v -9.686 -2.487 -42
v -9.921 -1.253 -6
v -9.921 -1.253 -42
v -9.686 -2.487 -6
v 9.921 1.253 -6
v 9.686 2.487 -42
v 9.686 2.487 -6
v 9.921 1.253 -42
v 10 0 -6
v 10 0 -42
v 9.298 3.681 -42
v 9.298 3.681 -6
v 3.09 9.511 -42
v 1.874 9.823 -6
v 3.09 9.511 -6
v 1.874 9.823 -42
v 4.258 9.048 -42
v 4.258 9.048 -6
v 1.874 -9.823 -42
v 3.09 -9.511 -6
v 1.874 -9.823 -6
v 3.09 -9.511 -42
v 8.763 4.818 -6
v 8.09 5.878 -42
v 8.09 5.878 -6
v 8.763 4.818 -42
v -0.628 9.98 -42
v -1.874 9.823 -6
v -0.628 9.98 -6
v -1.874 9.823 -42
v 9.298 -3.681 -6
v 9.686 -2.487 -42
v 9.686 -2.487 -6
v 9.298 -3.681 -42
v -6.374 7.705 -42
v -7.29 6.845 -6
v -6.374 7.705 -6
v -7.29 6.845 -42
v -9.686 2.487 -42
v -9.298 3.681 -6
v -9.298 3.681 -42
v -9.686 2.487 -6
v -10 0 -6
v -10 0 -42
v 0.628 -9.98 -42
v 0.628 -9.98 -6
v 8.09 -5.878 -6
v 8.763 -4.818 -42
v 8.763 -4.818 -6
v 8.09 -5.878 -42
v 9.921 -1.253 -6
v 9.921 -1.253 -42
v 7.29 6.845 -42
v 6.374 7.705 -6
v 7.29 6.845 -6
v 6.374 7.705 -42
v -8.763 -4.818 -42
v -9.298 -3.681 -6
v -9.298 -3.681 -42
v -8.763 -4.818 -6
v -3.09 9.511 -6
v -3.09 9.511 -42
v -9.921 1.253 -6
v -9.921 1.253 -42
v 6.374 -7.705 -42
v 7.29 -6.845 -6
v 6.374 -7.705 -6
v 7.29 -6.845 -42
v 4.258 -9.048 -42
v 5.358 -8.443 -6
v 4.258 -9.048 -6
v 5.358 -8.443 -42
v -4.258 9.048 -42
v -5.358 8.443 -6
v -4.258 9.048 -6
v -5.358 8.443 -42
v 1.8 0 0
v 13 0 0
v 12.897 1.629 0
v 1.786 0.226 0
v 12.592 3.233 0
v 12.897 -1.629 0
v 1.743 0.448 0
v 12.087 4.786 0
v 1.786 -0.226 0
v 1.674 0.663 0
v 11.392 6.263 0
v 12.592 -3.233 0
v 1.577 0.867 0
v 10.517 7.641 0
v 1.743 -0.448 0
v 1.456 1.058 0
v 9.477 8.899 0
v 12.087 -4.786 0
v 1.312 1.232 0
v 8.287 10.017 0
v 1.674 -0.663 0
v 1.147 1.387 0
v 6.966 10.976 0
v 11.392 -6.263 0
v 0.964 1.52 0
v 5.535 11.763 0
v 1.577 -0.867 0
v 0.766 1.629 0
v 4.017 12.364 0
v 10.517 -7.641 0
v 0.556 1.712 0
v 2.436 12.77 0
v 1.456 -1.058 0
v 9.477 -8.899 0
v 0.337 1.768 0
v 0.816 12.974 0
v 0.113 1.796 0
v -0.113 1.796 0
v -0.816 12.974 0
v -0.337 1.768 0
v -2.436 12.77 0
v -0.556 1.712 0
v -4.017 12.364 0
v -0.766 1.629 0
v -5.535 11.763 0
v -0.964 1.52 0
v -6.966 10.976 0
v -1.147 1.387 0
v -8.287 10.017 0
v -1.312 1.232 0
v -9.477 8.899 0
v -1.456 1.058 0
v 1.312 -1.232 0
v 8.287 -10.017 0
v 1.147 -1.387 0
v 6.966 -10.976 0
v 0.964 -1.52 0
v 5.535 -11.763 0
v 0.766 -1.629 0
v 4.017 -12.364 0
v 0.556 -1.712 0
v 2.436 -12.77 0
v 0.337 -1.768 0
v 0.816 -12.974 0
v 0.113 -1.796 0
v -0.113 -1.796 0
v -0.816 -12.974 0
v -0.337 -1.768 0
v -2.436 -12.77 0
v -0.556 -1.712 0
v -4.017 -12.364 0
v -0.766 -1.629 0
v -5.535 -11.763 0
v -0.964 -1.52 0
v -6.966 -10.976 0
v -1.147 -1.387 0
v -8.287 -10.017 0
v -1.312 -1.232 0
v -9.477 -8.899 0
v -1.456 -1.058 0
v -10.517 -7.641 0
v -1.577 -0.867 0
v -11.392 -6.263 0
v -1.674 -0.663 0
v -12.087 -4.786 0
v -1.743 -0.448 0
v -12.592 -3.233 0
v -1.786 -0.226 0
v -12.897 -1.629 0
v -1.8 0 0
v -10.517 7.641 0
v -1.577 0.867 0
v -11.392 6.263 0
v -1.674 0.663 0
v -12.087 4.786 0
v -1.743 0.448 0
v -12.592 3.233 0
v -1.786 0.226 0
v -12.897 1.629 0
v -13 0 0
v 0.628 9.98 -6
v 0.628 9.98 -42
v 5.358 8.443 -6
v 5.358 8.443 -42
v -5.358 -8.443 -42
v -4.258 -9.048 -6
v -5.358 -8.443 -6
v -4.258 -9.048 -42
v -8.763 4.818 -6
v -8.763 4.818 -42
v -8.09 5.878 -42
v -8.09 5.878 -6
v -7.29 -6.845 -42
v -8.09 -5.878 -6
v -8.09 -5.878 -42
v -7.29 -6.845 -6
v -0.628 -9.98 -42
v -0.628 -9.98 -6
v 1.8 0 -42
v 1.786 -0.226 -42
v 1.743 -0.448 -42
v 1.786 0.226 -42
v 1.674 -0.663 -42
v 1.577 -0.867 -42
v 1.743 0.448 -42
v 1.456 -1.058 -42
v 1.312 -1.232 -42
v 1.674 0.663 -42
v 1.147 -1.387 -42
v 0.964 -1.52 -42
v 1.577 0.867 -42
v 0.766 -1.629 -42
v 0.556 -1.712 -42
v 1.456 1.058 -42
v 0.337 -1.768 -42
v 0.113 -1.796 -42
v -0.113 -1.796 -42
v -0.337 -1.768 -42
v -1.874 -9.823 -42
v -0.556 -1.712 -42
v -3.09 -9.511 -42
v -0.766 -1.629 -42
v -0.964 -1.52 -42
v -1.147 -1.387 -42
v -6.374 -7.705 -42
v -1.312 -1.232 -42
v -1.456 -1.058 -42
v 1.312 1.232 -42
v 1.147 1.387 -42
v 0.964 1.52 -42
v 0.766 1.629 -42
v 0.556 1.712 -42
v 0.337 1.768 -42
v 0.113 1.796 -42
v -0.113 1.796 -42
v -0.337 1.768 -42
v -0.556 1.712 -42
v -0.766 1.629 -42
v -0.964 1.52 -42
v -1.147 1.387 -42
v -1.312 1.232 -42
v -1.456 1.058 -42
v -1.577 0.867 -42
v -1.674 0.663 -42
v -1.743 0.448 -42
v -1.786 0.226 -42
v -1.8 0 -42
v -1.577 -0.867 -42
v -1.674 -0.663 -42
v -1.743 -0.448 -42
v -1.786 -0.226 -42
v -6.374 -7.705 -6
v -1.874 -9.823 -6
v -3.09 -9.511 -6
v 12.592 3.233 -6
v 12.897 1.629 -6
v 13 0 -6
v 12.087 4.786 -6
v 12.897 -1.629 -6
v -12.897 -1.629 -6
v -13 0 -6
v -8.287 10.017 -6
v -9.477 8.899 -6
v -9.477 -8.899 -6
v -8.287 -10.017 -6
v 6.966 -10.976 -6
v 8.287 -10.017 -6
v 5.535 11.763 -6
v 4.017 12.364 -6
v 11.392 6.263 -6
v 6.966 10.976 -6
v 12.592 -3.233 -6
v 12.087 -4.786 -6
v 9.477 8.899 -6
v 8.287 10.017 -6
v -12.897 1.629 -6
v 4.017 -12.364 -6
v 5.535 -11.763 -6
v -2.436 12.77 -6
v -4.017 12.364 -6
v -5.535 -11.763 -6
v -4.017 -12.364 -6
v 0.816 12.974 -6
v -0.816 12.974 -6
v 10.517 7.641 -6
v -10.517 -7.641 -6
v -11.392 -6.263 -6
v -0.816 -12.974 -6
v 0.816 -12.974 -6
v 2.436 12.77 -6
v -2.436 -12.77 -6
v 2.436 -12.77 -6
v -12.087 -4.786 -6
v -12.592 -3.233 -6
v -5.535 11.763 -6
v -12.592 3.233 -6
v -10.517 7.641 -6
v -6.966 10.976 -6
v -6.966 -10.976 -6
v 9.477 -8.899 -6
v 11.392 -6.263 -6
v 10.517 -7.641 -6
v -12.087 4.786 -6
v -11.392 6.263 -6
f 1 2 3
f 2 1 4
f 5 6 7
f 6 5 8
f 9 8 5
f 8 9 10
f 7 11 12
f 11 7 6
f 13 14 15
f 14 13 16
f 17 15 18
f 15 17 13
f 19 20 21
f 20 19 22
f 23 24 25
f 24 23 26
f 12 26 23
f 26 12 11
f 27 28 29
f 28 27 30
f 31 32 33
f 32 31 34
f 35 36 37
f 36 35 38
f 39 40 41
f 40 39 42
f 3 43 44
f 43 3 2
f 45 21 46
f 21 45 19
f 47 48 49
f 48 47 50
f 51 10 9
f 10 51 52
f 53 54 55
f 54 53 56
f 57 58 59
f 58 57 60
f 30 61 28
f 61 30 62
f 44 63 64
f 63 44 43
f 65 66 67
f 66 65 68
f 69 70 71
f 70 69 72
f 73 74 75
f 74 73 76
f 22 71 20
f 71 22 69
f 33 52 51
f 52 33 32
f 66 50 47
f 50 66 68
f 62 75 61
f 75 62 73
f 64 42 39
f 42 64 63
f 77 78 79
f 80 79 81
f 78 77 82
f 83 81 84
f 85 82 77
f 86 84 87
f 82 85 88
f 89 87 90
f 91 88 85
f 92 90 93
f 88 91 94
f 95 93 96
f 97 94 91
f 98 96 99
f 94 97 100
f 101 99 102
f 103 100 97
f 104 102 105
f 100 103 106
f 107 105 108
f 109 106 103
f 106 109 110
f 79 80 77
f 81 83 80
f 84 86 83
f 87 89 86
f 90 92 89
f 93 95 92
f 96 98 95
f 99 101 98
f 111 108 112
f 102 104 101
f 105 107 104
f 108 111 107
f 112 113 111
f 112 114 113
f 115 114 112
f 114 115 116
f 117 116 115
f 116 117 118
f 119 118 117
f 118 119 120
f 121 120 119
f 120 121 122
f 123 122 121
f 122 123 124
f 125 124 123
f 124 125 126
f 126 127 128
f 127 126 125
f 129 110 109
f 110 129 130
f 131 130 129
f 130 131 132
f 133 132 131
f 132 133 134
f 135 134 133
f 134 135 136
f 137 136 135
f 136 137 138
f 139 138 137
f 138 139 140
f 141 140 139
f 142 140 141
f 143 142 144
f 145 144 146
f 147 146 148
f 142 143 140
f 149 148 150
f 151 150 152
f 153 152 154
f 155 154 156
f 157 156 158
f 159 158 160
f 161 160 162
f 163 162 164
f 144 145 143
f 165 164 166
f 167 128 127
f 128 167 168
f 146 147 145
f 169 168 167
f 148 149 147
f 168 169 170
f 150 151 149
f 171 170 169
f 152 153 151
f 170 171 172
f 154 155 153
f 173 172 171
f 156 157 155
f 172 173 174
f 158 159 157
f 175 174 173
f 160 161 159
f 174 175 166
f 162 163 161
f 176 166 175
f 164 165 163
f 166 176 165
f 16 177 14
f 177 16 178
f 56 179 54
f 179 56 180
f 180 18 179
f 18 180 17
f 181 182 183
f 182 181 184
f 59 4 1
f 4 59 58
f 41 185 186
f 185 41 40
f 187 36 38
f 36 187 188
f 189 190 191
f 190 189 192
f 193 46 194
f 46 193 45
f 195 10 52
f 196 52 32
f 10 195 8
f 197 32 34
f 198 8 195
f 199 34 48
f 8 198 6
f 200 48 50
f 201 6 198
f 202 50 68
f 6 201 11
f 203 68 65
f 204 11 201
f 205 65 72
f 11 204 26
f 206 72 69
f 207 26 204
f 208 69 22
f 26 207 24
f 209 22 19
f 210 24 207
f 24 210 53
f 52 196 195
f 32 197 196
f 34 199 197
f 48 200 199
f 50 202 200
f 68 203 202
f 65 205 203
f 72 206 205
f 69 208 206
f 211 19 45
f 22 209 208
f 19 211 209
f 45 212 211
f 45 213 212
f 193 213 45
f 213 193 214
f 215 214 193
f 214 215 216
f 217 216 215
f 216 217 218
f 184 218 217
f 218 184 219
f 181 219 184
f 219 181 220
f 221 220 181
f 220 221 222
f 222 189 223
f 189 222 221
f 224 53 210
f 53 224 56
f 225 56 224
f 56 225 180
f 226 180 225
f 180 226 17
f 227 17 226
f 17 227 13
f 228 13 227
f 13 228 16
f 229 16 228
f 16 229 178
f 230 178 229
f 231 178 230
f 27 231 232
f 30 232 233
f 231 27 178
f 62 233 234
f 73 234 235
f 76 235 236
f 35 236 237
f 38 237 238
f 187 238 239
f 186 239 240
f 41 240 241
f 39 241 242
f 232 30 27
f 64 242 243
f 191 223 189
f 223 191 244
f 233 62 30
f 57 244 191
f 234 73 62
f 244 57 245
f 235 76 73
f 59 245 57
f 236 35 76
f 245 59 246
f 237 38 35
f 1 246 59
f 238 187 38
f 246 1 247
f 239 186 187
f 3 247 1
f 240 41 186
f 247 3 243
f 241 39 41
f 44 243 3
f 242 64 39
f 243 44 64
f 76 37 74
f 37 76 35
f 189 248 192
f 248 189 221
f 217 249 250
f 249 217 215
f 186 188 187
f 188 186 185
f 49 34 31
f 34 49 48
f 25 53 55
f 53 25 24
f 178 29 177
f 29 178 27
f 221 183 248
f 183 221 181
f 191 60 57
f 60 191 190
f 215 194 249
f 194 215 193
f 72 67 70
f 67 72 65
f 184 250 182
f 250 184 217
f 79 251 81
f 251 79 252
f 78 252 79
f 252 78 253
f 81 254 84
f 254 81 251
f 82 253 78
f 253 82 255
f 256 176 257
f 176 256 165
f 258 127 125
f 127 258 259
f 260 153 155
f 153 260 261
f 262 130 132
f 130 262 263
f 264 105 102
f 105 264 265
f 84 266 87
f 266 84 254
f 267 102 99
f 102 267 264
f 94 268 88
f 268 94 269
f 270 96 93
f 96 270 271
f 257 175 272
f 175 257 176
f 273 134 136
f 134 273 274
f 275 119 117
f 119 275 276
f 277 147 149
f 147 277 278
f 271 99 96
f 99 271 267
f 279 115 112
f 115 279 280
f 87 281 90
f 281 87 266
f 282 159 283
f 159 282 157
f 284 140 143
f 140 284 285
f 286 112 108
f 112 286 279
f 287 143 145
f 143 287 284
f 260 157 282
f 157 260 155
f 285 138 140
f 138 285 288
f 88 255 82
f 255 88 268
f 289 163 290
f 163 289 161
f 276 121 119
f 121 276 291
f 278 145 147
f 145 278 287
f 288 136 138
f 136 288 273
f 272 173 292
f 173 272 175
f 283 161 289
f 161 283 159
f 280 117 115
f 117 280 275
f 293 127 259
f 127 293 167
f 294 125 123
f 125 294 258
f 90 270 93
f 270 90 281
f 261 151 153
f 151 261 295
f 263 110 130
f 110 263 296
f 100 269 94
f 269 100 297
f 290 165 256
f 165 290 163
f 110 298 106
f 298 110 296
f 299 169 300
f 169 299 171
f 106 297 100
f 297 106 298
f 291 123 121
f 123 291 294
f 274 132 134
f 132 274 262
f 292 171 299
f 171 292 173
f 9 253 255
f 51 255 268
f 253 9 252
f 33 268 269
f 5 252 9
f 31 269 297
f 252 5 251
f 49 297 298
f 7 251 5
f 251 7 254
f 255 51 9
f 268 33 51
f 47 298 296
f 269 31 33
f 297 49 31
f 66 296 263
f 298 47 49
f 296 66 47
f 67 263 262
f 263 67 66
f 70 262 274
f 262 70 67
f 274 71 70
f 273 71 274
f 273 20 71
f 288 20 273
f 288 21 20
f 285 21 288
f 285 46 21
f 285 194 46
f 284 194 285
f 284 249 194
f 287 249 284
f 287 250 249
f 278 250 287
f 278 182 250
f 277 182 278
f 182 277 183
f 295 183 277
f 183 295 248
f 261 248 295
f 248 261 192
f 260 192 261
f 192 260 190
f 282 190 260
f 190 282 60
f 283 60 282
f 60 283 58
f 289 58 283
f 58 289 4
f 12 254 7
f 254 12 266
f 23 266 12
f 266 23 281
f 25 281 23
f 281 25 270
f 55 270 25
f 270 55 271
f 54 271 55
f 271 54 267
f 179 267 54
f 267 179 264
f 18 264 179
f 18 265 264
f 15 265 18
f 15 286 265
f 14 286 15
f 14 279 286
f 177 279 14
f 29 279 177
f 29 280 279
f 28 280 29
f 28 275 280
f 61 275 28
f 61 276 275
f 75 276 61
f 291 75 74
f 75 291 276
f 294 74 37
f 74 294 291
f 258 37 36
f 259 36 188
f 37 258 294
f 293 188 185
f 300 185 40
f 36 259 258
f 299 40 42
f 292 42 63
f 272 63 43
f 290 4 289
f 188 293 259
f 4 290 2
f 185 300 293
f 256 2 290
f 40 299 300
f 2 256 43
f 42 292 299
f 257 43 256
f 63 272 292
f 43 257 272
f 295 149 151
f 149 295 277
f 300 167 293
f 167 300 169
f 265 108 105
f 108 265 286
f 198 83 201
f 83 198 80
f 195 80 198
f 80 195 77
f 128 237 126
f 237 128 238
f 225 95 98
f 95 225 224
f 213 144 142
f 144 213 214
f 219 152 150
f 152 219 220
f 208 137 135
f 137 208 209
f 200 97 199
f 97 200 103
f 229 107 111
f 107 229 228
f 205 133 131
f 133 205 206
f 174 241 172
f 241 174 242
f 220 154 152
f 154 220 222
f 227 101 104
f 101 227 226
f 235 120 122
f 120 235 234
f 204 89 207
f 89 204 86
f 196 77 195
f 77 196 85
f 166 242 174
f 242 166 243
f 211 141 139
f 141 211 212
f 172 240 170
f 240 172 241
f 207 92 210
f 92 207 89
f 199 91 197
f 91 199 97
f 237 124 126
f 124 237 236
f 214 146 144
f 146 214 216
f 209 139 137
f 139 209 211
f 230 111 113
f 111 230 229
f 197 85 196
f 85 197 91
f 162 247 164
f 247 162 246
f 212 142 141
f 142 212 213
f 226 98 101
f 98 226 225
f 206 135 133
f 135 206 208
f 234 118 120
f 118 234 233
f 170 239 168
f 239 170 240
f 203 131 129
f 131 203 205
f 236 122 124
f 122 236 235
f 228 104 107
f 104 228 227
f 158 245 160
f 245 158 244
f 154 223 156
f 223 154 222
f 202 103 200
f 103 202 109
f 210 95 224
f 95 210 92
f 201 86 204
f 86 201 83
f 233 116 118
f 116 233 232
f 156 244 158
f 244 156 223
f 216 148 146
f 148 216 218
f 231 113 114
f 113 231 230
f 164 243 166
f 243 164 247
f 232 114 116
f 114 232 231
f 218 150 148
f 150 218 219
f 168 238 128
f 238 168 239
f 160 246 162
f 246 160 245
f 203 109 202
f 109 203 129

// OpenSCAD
$fn = 50;


difference() {
	union() {
		translate(v = [0, 0, -42.0000000000]) {
			cylinder(h = 42, r = 10.0000000000);
		}
		translate(v = [0, 0, -6.0000000000]) {
			cylinder(h = 6, r = 13.0000000000);
		}
	}
	union() {
		#translate(v = [0, 0, -42]) {
			cylinder(h = 42, r = 1.8000000000);
		}
	}
}
